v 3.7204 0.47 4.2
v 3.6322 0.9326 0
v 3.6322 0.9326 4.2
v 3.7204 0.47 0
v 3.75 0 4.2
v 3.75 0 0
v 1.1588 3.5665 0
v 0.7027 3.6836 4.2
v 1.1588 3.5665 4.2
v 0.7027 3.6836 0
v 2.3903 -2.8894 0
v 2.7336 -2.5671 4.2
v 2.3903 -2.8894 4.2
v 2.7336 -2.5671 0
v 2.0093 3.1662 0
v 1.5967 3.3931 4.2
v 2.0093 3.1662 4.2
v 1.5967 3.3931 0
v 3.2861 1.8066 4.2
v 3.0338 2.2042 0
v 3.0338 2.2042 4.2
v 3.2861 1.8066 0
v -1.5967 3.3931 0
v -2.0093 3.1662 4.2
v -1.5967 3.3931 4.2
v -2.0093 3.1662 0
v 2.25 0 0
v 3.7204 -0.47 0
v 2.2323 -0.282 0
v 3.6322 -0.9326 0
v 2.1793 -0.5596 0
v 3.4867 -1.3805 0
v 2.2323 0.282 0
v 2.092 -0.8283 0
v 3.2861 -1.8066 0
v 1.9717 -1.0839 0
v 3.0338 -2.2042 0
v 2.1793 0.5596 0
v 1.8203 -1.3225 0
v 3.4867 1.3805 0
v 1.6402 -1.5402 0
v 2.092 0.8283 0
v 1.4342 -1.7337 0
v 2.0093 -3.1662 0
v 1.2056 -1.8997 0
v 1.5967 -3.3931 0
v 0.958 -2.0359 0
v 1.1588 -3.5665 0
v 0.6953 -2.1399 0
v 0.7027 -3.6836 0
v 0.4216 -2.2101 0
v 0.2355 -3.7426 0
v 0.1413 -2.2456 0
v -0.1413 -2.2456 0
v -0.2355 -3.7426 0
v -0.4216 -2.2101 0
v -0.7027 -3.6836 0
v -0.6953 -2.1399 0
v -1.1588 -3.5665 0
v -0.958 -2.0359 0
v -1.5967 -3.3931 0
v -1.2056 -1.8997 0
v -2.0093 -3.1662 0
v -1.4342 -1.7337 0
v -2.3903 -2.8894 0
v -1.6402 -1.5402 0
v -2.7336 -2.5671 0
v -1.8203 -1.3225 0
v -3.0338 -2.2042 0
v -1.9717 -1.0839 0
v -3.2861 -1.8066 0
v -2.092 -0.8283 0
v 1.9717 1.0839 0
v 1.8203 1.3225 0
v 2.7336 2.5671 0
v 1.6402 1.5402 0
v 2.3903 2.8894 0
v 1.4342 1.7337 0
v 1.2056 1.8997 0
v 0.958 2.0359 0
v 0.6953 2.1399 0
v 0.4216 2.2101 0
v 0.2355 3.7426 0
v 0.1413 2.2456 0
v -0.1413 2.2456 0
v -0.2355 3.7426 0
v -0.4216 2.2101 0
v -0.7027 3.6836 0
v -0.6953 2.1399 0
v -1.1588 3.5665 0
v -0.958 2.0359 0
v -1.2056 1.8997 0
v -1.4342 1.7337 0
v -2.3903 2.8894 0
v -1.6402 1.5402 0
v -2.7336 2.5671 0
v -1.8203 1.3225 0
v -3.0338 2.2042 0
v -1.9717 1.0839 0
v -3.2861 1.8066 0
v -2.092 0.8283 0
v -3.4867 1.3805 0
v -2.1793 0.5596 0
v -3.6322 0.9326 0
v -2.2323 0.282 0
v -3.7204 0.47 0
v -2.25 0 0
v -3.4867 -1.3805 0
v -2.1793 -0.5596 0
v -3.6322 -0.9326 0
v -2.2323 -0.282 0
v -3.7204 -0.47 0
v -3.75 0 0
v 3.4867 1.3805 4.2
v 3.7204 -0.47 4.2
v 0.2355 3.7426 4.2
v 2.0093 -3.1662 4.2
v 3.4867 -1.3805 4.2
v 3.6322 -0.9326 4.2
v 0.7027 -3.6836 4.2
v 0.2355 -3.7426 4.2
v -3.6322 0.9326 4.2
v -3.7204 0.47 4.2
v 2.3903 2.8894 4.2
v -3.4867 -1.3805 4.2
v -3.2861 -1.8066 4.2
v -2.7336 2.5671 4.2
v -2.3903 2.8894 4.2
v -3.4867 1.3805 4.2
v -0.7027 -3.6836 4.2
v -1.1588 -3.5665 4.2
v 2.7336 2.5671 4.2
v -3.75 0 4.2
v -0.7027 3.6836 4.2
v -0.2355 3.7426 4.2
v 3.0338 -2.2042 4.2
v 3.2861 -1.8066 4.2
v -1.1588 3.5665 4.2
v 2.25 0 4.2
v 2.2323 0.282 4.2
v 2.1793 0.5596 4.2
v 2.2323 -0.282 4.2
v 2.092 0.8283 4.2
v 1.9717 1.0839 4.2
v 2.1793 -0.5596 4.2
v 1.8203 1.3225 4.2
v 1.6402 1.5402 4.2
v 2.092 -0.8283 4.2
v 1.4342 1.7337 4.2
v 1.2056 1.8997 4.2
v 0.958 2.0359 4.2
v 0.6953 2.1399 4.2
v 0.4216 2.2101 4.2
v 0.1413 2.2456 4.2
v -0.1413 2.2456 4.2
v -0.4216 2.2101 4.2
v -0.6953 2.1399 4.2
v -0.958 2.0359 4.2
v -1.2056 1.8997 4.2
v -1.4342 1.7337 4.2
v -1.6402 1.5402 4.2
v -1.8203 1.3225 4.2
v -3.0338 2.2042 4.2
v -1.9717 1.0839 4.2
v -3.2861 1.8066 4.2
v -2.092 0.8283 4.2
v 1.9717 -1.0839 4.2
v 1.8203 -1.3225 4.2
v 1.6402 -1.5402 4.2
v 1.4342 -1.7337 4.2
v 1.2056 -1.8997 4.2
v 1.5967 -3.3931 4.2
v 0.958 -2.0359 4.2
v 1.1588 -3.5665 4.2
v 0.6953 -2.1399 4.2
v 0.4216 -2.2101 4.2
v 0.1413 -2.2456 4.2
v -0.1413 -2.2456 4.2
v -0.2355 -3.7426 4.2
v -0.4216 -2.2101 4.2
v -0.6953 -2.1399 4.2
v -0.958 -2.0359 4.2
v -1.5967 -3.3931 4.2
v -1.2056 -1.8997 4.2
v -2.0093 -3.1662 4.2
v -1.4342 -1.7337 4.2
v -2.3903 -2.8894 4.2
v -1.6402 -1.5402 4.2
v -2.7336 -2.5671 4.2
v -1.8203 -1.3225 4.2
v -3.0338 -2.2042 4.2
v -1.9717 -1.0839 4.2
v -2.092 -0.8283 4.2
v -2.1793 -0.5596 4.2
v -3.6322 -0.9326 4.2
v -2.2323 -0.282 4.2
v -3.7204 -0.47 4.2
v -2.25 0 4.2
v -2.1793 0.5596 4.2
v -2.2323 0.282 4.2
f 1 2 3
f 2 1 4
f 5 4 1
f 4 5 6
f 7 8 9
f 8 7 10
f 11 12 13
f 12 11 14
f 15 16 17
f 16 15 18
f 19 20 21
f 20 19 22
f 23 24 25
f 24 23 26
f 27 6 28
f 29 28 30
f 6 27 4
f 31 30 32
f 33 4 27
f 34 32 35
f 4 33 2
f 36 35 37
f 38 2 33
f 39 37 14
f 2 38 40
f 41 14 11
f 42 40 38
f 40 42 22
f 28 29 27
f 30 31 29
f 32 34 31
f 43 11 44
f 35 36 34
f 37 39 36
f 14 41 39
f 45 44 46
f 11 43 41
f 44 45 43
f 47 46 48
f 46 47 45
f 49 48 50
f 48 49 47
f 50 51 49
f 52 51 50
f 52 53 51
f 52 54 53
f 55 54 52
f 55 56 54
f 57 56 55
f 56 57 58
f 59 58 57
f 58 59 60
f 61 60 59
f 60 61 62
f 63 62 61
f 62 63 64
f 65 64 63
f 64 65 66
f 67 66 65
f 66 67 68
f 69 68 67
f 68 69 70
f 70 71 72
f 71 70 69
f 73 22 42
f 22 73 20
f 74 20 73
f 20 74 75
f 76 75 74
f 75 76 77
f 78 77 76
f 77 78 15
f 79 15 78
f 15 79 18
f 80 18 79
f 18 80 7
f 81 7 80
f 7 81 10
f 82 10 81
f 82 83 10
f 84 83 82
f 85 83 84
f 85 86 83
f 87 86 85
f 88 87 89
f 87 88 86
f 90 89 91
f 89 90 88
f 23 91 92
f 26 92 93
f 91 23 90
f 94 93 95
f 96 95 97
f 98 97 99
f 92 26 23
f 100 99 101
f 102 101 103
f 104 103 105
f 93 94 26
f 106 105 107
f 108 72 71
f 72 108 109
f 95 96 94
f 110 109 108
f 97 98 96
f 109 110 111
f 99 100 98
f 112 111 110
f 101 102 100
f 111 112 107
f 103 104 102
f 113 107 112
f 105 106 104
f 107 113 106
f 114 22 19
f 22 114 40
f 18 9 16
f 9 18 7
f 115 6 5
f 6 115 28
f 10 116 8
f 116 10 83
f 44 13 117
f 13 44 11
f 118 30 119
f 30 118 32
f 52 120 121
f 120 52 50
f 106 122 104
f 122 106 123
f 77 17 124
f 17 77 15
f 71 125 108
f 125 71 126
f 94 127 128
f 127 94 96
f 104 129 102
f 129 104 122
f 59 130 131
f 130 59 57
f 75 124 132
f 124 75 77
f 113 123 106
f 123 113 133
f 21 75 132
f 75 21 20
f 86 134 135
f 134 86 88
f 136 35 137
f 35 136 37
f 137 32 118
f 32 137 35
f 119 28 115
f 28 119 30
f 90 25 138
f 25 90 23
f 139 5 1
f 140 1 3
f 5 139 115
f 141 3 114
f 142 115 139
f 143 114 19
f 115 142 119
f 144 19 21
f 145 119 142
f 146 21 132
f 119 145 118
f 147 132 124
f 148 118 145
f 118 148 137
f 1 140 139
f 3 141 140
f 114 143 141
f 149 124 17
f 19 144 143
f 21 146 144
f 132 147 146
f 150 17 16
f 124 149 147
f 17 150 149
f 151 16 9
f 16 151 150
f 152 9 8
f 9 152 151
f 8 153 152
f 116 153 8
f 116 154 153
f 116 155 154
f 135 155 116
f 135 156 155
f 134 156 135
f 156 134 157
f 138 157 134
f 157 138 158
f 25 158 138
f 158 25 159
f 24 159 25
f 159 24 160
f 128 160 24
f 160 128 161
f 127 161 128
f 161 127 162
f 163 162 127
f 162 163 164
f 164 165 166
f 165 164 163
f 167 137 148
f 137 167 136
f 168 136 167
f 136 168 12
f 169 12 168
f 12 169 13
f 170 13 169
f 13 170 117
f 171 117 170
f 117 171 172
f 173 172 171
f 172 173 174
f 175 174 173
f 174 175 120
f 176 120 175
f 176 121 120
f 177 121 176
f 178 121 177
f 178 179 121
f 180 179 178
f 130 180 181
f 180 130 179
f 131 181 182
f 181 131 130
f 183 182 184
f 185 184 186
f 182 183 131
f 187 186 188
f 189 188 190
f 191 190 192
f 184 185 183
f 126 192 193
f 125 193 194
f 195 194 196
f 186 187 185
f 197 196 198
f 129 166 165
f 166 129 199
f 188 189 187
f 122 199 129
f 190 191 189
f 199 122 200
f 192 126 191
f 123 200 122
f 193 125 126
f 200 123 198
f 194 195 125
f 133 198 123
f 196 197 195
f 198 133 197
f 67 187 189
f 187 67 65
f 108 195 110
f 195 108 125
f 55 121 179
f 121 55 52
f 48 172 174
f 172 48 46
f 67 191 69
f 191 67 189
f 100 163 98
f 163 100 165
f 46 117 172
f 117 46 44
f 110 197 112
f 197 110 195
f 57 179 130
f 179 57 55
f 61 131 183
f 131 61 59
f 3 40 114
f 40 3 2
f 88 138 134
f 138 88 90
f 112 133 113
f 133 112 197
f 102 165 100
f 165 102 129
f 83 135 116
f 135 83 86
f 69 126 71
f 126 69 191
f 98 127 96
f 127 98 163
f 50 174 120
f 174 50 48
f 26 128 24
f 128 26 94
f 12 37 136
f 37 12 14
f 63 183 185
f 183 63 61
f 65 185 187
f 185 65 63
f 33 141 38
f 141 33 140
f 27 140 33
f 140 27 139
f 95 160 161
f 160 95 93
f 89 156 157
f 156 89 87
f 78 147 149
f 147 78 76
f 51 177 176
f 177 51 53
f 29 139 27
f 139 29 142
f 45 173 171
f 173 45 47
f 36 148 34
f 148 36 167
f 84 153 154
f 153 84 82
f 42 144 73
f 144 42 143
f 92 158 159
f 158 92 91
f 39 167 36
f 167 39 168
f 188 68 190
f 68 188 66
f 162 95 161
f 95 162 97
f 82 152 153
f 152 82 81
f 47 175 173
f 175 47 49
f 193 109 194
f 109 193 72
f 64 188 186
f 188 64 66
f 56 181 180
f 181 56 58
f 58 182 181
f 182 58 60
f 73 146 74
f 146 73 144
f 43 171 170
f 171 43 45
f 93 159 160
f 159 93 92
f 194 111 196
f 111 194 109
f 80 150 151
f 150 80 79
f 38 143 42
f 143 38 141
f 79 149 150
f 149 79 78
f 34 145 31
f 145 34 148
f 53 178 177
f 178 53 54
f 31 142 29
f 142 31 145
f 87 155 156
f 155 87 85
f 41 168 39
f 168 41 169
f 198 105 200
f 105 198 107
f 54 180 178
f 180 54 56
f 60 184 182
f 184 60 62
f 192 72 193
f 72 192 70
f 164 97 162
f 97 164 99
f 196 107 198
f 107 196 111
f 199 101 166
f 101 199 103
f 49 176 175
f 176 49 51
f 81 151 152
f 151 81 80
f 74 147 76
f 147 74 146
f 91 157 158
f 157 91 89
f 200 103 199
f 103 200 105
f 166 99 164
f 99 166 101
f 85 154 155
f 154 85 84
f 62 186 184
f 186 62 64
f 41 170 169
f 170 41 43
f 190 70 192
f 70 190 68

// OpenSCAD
$fn = 50;
h = 4.2;
ext_d = 7.5;
int_d = 4.5;

difference() {
  cylinder(d=ext_d, h=h);
  cylinder(d=int_d, h=h);
}
